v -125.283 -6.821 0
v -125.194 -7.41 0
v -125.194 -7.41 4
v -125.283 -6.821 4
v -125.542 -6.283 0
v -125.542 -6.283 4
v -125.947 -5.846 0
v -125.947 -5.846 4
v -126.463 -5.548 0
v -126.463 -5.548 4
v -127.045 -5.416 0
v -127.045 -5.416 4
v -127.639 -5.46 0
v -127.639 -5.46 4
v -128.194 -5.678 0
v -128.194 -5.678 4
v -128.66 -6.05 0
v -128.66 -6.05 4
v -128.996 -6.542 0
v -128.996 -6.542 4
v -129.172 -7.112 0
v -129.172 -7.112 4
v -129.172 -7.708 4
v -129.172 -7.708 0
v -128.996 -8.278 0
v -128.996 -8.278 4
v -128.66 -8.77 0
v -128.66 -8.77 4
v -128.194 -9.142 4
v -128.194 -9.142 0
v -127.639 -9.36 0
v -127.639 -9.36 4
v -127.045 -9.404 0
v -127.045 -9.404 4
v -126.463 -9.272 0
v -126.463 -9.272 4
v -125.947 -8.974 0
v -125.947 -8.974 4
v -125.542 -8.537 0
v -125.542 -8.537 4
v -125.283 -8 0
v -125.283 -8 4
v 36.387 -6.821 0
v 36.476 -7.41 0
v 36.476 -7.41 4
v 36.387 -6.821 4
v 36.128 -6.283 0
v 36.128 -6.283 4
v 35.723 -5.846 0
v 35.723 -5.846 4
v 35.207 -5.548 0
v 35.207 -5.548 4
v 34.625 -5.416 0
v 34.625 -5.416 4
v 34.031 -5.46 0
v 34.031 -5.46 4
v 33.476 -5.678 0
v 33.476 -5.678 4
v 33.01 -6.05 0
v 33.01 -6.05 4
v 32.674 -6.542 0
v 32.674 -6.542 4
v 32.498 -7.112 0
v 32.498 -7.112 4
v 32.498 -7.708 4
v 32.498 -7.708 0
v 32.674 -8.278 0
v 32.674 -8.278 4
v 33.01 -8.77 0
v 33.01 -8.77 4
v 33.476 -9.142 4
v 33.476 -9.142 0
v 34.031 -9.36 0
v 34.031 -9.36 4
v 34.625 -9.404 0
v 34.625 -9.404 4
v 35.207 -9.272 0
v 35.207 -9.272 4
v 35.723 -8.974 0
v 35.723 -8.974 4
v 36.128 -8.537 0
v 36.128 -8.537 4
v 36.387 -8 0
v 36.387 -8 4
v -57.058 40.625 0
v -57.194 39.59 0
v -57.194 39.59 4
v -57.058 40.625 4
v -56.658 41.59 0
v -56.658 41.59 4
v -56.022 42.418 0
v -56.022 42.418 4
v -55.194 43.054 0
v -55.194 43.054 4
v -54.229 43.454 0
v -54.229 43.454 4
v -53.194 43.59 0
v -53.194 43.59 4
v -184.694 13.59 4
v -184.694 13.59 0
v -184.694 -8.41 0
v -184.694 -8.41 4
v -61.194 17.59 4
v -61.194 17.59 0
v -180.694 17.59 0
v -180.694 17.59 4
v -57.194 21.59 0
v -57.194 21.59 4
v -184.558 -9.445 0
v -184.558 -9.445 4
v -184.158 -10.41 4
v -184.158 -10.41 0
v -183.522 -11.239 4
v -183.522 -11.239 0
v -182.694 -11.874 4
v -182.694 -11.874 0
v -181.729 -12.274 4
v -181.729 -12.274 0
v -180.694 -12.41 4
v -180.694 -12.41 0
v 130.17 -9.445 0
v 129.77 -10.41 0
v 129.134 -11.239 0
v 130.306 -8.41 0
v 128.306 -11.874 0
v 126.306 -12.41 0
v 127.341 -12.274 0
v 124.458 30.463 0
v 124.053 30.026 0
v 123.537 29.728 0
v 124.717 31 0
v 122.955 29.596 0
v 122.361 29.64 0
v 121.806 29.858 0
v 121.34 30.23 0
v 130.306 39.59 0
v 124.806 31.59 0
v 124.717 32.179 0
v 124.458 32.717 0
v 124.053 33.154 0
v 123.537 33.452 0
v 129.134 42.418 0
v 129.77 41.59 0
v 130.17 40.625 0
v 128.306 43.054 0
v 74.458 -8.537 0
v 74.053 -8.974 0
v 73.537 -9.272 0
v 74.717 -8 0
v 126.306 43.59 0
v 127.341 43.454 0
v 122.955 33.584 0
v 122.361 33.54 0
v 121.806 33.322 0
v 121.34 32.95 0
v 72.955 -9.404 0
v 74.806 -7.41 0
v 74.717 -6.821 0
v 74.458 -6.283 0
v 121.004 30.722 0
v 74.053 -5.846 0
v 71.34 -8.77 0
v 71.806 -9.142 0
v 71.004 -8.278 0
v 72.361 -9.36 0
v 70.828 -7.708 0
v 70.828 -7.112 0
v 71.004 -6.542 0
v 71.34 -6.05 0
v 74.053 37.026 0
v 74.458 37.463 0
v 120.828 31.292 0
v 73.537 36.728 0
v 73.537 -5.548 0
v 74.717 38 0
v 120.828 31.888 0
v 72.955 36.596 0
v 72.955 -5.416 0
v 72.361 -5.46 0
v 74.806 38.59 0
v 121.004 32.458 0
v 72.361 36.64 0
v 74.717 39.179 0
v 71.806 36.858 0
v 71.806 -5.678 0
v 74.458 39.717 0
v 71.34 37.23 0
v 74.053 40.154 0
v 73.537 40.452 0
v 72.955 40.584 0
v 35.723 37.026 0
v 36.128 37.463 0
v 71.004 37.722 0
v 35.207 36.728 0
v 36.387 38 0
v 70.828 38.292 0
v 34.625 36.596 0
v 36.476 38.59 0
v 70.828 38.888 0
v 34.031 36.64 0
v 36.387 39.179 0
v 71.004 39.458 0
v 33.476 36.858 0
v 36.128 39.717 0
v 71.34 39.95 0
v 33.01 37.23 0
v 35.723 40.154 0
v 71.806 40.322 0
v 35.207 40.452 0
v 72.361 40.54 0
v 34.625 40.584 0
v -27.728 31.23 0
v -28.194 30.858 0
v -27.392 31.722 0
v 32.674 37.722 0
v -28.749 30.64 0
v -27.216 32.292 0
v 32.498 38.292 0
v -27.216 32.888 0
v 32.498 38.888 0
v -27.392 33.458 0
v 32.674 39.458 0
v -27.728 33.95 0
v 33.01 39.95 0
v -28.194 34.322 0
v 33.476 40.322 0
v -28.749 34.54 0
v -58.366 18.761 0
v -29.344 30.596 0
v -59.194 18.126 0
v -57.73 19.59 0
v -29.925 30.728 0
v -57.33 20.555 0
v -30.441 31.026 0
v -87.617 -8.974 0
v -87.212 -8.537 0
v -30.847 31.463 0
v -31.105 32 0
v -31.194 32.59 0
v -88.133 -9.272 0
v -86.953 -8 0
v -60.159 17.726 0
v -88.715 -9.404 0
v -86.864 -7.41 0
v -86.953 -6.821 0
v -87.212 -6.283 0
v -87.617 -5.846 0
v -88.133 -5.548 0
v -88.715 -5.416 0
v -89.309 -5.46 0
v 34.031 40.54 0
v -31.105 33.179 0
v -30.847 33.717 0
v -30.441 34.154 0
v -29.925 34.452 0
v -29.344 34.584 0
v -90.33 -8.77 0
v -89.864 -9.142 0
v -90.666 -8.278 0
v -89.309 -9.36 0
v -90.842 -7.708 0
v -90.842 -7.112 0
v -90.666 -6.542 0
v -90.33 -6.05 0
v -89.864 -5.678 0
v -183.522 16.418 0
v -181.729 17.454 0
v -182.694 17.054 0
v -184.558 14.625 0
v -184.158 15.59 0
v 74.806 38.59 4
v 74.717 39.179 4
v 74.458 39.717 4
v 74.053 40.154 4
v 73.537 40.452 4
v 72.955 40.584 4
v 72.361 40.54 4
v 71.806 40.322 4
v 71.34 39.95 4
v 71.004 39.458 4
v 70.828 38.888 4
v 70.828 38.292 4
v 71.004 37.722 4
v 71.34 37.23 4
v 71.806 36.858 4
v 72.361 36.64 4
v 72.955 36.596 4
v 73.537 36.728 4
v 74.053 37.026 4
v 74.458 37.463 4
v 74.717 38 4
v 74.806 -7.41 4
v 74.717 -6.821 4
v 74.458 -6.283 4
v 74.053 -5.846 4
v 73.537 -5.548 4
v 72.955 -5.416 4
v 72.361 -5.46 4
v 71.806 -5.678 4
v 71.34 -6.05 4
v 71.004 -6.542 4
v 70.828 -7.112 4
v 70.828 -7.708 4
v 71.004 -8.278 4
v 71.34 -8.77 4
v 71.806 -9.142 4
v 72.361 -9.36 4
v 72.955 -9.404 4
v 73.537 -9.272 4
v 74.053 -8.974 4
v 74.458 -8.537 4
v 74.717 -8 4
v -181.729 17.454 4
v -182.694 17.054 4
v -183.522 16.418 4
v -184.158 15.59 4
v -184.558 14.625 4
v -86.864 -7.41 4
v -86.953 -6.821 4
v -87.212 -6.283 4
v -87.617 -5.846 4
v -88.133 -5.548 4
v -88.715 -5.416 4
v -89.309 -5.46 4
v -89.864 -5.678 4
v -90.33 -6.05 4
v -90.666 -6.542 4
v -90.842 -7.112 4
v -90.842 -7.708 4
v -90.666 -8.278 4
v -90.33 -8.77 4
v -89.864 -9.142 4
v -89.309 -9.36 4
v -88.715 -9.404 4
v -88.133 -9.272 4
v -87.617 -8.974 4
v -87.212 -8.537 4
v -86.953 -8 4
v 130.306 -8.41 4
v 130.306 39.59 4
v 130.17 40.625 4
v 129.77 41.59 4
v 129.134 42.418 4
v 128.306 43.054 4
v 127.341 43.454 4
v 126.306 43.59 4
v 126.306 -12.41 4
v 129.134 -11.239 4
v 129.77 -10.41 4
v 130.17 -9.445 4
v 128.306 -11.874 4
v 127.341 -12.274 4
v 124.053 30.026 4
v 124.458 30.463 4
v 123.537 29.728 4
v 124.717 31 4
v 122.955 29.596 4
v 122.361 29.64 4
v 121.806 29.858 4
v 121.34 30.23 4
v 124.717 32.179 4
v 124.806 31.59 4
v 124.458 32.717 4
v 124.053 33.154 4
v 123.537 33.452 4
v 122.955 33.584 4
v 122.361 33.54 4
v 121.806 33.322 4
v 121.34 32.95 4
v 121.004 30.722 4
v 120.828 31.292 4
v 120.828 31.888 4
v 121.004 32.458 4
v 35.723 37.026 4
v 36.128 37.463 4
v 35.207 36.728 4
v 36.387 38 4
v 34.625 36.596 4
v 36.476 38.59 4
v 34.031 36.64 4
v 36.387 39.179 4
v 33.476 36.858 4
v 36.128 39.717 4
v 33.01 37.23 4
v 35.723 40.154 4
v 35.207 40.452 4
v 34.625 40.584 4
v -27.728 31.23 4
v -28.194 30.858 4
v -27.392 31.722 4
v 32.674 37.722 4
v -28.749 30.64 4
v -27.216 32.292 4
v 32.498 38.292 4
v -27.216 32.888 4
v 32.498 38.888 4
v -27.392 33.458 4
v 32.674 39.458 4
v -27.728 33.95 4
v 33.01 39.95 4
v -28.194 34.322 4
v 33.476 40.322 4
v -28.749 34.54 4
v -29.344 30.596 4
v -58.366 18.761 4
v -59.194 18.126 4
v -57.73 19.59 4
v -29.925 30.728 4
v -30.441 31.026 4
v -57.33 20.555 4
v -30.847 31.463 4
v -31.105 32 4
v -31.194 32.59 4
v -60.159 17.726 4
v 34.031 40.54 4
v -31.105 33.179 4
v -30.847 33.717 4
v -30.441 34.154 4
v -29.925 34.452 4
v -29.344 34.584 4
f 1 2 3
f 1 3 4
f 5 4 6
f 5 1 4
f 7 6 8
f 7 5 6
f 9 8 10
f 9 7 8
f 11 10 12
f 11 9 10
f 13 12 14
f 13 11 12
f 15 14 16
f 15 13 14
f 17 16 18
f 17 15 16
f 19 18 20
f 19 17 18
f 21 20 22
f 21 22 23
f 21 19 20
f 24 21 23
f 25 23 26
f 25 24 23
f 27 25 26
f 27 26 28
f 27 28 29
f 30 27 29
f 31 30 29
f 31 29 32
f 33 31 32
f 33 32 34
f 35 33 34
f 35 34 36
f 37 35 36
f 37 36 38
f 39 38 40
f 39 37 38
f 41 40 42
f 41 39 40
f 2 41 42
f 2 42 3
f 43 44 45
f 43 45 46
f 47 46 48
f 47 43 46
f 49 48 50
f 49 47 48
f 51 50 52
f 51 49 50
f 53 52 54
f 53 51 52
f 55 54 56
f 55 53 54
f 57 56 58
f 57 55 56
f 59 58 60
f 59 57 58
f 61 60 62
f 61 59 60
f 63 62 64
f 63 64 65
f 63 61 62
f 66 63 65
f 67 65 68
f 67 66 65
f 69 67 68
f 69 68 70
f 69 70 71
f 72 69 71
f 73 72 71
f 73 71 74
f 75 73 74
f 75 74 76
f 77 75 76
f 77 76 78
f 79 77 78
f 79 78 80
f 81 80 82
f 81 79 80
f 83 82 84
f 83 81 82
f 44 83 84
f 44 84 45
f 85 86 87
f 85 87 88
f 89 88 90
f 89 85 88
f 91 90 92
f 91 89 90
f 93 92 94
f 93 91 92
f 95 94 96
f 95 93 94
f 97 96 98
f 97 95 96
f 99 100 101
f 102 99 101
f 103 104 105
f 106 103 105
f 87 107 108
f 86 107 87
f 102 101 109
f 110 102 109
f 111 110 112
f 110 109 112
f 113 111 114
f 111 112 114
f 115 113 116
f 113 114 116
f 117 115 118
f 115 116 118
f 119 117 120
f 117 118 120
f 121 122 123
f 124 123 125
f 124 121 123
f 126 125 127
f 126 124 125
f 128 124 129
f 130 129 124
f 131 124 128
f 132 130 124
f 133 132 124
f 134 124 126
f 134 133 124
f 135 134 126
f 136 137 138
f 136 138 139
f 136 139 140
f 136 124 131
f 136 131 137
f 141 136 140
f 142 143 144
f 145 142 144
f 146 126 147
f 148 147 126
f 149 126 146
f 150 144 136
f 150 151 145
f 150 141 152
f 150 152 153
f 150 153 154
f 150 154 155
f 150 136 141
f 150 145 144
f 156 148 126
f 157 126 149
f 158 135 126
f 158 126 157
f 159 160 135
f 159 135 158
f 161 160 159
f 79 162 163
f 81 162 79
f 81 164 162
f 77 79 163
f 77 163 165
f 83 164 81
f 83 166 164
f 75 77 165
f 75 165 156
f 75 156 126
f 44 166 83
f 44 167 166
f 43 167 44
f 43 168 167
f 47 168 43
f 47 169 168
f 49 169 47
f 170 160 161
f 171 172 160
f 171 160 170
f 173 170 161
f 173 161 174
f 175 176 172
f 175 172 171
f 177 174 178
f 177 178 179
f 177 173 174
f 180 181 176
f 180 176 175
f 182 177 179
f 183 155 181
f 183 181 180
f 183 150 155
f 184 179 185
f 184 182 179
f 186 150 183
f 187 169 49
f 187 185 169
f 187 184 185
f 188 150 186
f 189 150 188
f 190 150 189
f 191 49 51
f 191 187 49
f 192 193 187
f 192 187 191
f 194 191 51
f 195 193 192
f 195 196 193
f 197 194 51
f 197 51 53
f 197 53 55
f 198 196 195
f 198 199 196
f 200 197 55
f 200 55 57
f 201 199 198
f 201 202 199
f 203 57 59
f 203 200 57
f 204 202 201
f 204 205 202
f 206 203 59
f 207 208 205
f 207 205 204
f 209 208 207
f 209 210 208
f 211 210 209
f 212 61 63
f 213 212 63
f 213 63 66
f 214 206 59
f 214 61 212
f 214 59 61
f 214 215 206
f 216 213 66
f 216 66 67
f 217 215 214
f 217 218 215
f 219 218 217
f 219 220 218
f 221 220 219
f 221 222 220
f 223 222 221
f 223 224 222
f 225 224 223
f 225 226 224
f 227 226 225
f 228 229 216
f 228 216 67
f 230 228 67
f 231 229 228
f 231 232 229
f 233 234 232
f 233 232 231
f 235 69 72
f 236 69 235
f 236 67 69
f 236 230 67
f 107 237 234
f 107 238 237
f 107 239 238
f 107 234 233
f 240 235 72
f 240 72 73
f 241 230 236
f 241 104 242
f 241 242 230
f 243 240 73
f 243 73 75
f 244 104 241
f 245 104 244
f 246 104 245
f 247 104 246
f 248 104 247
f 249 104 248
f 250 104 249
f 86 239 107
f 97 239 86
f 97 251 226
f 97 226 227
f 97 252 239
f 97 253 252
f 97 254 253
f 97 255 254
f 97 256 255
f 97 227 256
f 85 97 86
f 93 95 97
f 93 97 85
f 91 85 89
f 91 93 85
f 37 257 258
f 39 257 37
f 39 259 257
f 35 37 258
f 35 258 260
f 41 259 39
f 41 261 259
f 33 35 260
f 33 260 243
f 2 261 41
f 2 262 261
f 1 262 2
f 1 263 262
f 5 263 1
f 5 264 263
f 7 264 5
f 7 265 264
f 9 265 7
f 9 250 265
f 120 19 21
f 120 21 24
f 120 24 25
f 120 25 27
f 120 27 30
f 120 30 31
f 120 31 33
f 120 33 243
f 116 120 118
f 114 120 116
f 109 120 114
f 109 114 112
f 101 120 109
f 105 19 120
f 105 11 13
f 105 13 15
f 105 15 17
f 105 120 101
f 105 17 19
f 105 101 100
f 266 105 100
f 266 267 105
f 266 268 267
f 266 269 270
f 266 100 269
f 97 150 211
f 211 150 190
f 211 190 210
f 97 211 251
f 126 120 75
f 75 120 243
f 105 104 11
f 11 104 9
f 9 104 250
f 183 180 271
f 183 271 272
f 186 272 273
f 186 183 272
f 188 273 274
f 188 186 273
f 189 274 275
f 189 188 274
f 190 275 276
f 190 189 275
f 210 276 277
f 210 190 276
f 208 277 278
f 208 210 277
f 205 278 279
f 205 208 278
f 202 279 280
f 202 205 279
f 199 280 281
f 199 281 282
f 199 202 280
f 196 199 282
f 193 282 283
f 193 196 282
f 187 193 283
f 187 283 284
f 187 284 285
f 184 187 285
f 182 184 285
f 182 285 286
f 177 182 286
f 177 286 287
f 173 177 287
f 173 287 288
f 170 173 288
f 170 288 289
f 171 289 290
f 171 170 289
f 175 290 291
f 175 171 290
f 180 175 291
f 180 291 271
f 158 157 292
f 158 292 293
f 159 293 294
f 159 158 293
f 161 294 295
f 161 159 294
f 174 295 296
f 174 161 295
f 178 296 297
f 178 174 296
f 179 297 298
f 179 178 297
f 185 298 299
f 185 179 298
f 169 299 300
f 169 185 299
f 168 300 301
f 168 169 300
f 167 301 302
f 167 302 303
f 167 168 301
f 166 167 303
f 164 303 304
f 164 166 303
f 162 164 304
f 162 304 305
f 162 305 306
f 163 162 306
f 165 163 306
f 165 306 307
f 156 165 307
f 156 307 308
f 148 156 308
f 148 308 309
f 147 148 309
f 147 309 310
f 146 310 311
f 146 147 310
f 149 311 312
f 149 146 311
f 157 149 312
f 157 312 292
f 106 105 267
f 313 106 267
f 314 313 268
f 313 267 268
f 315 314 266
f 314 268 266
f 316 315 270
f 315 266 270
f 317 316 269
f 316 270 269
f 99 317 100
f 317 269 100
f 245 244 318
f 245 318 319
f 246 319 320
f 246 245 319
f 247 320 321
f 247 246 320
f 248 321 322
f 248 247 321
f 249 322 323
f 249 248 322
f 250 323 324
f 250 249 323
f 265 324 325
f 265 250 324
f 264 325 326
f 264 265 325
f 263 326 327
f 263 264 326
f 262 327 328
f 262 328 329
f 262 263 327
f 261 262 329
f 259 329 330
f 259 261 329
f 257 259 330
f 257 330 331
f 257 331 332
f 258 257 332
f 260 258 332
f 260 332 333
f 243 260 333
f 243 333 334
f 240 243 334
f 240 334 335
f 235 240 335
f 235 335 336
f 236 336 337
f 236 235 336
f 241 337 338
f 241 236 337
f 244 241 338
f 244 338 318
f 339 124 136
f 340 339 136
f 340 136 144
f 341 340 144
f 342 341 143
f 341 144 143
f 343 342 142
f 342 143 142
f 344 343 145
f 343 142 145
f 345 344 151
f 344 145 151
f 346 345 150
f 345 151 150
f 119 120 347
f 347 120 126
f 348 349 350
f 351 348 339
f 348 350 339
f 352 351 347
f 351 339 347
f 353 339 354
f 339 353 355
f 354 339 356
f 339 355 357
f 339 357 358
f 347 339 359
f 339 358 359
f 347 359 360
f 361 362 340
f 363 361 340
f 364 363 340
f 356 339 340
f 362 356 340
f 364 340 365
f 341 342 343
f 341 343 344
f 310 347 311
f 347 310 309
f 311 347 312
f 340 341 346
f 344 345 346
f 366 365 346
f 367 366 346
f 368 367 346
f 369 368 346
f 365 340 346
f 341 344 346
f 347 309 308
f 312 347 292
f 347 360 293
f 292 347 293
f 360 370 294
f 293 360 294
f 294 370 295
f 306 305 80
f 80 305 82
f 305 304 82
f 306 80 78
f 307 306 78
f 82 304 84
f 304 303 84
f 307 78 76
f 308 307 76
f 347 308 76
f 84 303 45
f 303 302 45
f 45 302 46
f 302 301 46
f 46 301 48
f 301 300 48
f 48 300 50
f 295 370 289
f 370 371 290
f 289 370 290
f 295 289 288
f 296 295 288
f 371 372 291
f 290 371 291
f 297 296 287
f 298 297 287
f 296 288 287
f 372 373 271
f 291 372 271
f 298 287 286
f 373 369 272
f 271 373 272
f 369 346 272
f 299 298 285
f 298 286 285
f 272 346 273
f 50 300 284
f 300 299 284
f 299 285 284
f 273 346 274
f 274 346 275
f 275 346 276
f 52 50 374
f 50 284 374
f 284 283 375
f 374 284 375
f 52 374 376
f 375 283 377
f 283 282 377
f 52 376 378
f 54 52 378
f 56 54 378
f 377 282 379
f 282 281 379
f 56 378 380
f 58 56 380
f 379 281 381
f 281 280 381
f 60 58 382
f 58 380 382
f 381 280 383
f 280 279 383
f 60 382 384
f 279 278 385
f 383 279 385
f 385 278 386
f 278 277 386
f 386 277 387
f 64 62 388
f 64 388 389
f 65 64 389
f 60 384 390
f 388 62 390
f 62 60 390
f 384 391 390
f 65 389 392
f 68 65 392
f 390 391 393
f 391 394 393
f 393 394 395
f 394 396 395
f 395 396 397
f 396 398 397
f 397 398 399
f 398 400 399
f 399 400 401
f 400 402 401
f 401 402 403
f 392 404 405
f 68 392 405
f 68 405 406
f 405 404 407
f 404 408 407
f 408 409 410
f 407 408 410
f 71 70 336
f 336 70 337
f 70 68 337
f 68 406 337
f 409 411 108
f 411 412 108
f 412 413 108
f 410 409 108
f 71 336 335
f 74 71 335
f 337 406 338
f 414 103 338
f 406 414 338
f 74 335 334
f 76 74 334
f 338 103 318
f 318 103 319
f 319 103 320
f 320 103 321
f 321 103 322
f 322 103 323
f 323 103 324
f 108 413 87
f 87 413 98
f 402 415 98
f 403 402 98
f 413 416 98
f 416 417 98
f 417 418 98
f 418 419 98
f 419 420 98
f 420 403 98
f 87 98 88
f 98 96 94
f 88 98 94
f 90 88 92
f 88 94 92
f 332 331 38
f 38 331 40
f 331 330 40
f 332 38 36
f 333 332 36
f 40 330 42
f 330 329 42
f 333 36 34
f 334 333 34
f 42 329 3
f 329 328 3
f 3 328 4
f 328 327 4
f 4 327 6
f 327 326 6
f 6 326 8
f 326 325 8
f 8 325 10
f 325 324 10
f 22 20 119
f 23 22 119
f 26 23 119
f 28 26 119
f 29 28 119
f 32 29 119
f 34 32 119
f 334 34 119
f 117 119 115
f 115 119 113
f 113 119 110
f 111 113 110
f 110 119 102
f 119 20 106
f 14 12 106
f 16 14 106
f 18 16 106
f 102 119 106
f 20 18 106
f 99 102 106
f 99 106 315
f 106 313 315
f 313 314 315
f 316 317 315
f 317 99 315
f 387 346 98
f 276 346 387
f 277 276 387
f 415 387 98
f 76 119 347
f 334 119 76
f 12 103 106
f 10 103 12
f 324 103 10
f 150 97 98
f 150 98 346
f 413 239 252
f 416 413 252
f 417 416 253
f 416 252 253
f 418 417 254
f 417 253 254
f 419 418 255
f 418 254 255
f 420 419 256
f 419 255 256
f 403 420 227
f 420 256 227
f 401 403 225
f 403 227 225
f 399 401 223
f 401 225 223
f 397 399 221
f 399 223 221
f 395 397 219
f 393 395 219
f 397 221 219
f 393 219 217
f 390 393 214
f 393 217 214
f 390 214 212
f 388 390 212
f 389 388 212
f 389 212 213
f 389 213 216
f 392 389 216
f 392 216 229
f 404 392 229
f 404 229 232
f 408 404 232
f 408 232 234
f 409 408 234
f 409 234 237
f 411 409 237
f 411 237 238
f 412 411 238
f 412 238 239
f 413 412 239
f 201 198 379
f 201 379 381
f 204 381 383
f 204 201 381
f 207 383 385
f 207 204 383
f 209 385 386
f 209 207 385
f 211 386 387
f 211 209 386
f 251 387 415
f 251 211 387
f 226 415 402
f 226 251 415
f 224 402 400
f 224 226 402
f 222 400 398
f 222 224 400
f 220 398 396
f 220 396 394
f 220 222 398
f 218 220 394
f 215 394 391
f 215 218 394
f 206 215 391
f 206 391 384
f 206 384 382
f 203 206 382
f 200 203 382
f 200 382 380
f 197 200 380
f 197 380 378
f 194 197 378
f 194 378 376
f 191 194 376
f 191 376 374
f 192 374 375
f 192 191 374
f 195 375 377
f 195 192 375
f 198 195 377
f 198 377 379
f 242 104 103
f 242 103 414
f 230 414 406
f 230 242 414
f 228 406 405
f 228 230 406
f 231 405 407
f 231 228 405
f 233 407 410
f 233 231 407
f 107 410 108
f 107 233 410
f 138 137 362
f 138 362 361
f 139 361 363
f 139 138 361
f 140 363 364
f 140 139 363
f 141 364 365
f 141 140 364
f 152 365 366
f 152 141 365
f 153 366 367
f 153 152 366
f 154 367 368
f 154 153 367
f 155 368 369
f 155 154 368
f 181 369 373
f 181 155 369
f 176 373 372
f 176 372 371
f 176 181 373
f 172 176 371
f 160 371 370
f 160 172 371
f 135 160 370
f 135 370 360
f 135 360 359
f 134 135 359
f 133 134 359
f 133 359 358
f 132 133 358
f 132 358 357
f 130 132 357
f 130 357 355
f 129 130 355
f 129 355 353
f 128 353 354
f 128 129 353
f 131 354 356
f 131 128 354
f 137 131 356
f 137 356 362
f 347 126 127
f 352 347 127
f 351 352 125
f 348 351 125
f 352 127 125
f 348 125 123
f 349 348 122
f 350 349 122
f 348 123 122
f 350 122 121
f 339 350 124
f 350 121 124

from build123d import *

# Parameters (mm, degrees)
SKETCH_1_R          = 2
EXTRUDE_1_DEPTH     = 4
EXTRUDE_3_DEPTH     = 4
SKETCH_7_R          = 2
CUT_EXTRUDE_2_DEPTH = 10


with BuildPart() as part:
    # 草图1 → 凸台-拉伸1 (new body)
    with BuildSketch(Plane.XY):
        with BuildLine():
            Line((-180.694062755, -12.410089261), (126.305937245, -12.410089261))
            ThreePointArc((126.305937245, -12.410089261), (129.13436437, -11.238516386), (130.305937245, -8.410089261))
            Line((130.305937245, -8.410089261), (130.305937245, 7.71191214))
            Line((130.305937245, 7.71191214), (130.305937245, 17.589910739))
            Line((130.305937245, 17.589910739), (130.305937245, 39.589910739))
            ThreePointArc((130.305937245, 39.589910739), (129.13436437, 42.418337863), (126.305937245, 43.589910739))
            Line((126.305937245, 43.589910739), (-23.194062755, 43.589910739))
            ThreePointArc((-23.194062755, 43.589910739), (-26.022489879, 42.418337863), (-27.194062755, 39.589910739))
            Line((-27.194062755, 39.589910739), (-27.194062755, 27.589910739))
            ThreePointArc((-27.194062755, 27.589910739), (-30.122994943, 20.518842927), (-37.194062755, 17.589910739))
            Line((-37.194062755, 17.589910739), (-180.694062755, 17.589910739))
            ThreePointArc((-180.694062755, 17.589910739), (-183.522489879, 16.418337863), (-184.694062755, 13.589910739))
            Line((-184.694062755, 13.589910739), (-184.694062755, -8.410089261))
            ThreePointArc((-184.694062755, -8.410089261), (-183.522489879, -11.238516386), (-180.694062755, -12.410089261))
        make_face()
        with Locations((-127.194062755, -7.410089261)):
            Circle(SKETCH_1_R, mode=Mode.SUBTRACT)
        with Locations((-88.864062755, -7.410089261)):
            Circle(SKETCH_1_R, mode=Mode.SUBTRACT)
        with Locations((34.475937245, -7.410089261)):
            Circle(SKETCH_1_R, mode=Mode.SUBTRACT)
        with Locations((72.805937245, -7.410089261)):
            Circle(SKETCH_1_R, mode=Mode.SUBTRACT)
        with Locations((34.475937245, 38.589910739)):
            Circle(SKETCH_1_R, mode=Mode.SUBTRACT)
        with Locations((122.805937245, 31.589910739)):
            Circle(SKETCH_1_R, mode=Mode.SUBTRACT)
        with Locations((72.805937245, 38.589910739)):
            Circle(SKETCH_1_R, mode=Mode.SUBTRACT)
    extrude(amount=EXTRUDE_1_DEPTH)

    # 草图2 → 凸台-拉伸3 (add)
    with BuildSketch(Plane(origin=(0, 0, 0), x_dir=(-1, 0, 0), z_dir=(0, 0, -1))):
        with BuildLine():
            Line((53.194062755, 43.589910739), (23.194062755, 43.589910739))
            Line((23.194062755, 43.589910739), (23.194062755, 17.589910739))
            Line((23.194062755, 17.589910739), (57.194062755, 17.589910739))
            Line((57.194062755, 17.589910739), (61.194062755, 17.589910739))
            ThreePointArc((61.194062755, 17.589910739), (58.36563563, 18.761483614), (57.194062755, 21.589910739))
            Line((57.194062755, 21.589910739), (57.194062755, 39.589910739))
            ThreePointArc((57.194062755, 39.589910739), (56.022489879, 42.418337863), (53.194062755, 43.589910739))
        make_face()
    extrude(amount=-EXTRUDE_3_DEPTH)

    # 草图7 → 切除-拉伸2 (cut)
    with BuildSketch(Plane(origin=(0, 0, 0), x_dir=(-1, 0, 0), z_dir=(0, 0, -1))):
        with Locations((29.194062755, 32.589910739)):
            Circle(SKETCH_7_R)
    extrude(amount=-CUT_EXTRUDE_2_DEPTH, mode=Mode.SUBTRACT)


solid = part.part
